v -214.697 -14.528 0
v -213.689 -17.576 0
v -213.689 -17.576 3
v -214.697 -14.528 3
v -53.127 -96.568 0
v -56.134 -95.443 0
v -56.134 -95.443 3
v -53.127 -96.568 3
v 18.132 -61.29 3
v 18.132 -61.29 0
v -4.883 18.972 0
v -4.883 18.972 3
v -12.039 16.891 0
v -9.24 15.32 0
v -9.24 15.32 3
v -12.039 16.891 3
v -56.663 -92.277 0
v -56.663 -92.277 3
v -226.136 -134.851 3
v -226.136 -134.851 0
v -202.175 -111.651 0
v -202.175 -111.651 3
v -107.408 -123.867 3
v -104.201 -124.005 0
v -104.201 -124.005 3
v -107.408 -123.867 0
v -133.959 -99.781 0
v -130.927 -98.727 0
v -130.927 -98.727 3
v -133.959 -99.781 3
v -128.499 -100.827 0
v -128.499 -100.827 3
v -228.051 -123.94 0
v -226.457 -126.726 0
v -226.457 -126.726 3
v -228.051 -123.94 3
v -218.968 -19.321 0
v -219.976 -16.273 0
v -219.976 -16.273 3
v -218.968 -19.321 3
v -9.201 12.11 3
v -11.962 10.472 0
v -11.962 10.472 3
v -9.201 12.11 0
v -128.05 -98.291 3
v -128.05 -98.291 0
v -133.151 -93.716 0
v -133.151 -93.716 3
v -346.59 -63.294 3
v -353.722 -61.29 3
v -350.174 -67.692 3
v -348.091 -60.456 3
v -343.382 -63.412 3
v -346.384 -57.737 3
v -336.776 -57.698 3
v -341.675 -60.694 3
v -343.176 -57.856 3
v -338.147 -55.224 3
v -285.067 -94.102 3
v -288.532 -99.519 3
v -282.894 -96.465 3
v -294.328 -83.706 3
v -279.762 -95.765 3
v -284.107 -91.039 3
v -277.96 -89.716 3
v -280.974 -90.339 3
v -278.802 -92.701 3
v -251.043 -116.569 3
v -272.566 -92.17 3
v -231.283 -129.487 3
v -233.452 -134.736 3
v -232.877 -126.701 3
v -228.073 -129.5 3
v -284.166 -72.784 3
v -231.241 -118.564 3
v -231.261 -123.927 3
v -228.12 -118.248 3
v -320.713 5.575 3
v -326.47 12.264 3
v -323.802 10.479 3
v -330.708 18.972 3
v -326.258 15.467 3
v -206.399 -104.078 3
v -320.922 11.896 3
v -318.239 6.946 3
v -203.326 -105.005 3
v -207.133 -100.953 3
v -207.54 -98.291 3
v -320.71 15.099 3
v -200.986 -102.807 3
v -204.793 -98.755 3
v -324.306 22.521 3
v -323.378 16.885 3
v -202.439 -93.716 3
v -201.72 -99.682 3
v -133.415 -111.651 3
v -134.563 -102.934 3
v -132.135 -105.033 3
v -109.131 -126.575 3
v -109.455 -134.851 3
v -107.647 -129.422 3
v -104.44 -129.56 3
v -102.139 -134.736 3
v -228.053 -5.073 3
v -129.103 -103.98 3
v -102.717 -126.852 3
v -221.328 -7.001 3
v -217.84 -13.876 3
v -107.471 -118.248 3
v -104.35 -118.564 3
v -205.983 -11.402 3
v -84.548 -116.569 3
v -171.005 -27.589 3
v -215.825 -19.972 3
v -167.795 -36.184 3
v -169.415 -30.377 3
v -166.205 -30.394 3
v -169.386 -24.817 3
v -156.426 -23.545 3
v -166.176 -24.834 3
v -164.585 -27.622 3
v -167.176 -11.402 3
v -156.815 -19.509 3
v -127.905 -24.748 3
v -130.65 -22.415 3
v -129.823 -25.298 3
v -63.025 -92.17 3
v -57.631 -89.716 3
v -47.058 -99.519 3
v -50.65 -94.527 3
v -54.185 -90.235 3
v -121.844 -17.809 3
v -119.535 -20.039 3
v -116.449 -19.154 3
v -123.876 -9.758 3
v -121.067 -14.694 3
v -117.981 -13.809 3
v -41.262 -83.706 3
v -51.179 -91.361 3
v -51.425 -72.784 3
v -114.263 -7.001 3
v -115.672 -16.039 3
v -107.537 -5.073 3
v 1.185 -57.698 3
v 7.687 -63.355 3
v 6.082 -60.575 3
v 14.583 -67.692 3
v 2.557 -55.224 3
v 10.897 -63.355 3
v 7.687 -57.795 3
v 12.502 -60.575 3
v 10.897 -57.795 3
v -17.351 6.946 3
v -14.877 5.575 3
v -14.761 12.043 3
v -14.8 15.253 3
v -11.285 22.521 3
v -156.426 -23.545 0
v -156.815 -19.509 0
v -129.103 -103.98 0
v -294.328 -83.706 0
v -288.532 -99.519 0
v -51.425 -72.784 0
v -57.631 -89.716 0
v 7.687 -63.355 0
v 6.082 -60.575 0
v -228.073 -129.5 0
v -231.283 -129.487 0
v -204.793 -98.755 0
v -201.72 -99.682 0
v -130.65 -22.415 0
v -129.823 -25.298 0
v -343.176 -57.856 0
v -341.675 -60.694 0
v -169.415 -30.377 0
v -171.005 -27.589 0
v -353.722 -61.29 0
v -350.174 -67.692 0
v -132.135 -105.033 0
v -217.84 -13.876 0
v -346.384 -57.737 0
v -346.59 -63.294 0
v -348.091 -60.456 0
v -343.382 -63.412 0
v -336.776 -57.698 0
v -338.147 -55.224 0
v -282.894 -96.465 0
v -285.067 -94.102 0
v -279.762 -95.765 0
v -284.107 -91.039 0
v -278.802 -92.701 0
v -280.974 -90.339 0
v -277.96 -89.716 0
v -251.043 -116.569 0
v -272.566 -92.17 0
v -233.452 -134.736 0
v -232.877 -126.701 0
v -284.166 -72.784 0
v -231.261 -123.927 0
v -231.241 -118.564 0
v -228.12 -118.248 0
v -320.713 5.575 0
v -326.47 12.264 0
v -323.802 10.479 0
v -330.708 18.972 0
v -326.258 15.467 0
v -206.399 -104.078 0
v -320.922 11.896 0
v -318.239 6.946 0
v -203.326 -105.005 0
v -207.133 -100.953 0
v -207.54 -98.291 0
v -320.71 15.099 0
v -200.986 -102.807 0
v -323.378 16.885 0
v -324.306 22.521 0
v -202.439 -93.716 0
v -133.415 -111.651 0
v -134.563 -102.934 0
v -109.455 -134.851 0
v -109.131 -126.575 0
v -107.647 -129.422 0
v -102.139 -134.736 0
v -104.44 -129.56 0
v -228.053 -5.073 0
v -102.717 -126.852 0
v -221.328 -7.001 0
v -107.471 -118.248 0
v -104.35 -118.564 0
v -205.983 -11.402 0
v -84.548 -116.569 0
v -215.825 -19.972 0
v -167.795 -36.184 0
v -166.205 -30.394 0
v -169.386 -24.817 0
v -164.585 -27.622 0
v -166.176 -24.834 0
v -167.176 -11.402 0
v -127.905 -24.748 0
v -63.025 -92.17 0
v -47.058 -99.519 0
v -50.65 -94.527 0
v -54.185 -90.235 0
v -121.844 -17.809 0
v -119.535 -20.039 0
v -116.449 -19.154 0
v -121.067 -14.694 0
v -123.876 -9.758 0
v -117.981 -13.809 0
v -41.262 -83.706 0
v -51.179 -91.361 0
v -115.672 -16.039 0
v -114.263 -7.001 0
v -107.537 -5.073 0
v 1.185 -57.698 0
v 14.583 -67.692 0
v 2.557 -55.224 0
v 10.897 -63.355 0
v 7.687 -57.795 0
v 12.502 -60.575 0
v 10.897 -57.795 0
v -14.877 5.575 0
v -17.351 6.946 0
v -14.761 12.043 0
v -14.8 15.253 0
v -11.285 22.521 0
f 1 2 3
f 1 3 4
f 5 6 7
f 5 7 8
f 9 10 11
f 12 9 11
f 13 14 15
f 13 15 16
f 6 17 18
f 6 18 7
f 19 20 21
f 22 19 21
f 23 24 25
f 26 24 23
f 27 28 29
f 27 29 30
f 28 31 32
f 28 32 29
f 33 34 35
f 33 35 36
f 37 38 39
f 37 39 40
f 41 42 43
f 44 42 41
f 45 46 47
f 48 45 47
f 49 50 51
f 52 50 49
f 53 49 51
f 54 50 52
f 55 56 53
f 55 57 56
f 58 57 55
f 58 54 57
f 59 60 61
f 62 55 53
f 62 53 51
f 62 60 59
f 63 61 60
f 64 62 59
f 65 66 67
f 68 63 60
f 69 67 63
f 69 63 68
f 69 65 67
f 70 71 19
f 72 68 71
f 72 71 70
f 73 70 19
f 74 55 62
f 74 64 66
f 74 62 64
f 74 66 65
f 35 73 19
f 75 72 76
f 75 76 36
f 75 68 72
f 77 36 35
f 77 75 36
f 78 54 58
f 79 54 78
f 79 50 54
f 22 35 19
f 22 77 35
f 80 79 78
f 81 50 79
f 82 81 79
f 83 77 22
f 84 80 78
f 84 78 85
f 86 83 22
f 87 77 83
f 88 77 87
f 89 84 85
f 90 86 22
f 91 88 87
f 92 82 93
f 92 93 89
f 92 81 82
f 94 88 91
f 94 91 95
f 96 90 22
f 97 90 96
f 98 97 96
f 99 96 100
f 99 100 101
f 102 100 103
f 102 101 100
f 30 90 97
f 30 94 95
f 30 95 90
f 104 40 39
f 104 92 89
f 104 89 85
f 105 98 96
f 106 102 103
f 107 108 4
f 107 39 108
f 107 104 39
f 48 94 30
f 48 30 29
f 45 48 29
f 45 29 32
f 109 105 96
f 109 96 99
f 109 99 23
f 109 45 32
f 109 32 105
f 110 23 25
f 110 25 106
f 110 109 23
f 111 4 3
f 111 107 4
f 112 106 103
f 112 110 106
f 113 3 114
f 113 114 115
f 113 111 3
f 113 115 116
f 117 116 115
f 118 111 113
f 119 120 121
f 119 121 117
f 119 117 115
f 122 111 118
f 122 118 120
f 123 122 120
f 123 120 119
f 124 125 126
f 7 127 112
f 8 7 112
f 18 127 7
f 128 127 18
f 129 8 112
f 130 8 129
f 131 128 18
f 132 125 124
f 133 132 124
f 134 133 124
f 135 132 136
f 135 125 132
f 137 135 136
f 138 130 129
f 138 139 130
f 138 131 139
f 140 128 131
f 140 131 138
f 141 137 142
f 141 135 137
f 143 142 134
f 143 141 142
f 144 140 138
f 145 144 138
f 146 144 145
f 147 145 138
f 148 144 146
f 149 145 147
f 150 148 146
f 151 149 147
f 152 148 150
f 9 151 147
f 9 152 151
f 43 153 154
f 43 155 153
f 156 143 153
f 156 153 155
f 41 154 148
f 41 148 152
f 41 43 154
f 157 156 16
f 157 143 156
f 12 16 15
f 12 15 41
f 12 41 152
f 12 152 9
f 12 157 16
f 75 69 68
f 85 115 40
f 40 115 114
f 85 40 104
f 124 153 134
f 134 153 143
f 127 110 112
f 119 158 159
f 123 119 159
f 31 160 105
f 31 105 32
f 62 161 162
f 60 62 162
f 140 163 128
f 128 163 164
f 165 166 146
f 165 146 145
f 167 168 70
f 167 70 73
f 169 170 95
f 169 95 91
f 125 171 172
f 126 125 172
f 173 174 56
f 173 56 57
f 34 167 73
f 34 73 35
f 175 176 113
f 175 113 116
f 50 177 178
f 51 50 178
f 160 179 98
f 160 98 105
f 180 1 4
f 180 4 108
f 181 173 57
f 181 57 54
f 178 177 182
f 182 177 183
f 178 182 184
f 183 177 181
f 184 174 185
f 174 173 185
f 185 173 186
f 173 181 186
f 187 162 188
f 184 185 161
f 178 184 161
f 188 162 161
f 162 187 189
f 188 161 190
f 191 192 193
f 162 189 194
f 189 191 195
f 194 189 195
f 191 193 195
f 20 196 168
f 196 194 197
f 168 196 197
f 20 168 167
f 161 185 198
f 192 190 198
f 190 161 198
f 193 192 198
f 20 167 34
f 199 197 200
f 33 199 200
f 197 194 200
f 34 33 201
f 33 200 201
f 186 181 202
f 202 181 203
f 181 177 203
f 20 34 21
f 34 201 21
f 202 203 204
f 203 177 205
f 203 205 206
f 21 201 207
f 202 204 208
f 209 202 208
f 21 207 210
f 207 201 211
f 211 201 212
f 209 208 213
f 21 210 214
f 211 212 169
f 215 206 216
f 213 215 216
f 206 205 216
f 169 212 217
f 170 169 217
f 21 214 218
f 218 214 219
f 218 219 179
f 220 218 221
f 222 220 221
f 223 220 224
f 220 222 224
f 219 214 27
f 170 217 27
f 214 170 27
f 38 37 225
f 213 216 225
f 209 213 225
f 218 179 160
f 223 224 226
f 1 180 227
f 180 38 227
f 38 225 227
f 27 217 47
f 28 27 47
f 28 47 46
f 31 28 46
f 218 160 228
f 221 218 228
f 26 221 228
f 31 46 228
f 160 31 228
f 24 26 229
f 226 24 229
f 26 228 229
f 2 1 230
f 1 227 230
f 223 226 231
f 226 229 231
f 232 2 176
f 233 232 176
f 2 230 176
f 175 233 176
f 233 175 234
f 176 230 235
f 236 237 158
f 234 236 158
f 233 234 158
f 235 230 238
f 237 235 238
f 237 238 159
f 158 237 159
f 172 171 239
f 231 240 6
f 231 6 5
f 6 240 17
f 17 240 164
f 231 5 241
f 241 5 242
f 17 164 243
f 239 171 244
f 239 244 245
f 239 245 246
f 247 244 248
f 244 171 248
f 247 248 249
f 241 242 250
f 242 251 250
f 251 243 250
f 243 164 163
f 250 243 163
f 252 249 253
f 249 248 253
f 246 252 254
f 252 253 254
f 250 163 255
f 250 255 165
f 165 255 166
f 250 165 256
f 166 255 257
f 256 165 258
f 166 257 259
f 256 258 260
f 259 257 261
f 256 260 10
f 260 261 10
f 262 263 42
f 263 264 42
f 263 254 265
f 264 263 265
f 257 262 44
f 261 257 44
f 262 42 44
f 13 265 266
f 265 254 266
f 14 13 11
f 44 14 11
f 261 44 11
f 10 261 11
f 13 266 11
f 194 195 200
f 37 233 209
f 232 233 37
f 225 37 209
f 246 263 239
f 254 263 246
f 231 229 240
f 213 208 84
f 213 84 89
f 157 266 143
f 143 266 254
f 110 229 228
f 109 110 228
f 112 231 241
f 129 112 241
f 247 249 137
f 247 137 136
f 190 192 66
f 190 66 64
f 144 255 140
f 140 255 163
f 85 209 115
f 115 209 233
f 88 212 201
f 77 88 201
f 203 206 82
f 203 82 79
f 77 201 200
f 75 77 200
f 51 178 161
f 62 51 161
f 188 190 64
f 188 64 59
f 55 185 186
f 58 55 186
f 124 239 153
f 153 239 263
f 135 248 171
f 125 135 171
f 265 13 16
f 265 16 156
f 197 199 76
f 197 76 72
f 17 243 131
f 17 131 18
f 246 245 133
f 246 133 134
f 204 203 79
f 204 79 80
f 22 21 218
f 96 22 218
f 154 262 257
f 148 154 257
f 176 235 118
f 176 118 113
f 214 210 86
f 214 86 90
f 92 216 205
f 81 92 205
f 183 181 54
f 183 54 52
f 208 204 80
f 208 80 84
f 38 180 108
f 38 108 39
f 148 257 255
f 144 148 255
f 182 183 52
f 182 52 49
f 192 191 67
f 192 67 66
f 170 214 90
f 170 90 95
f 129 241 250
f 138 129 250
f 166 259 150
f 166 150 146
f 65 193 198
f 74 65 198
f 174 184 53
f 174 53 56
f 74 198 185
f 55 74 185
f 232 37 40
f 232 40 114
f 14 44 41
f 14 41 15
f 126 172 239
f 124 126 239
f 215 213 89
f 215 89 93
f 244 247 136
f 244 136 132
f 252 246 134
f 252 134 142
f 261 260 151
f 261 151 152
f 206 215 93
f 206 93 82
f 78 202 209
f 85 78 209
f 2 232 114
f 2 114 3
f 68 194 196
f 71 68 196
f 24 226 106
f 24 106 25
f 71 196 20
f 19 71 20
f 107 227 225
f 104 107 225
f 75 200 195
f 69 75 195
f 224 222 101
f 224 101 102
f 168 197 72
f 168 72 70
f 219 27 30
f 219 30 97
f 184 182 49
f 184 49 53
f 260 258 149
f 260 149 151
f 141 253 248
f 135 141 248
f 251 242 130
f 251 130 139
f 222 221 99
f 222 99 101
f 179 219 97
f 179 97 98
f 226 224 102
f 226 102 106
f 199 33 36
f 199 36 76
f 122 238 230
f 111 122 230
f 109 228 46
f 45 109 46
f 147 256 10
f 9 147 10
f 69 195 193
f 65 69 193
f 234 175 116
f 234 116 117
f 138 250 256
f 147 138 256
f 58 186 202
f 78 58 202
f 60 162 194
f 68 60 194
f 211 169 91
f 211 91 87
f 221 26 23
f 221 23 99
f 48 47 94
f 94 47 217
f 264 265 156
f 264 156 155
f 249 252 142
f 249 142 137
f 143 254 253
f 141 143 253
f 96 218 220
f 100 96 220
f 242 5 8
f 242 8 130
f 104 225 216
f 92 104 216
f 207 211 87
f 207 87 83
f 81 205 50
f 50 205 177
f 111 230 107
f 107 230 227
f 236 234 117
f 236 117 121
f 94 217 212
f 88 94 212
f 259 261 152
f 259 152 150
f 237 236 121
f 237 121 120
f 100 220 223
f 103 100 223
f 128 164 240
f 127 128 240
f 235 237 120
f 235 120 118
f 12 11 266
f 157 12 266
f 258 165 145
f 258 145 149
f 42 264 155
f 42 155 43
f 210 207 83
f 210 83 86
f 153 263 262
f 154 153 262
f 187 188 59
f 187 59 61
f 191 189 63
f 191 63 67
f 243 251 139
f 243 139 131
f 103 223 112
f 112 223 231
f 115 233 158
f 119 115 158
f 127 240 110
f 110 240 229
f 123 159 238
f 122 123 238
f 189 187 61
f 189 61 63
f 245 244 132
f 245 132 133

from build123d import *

# Parameters (mm, degrees)
BOSS_EXTRU_1_DEPTH = 3


with BuildPart() as part:
    # Esquisse1 → Boss.-Extru.1 (new body)
    with BuildSketch(Plane.XY):
        Polygon((-207.540430482, -98.290842938), (-228.119574859, -118.248029963), (-231.240854108, -118.563827288), (-272.565847516, -92.169507978), (-277.959789872, -89.716454796), (-284.165989399, -72.783703169), (-336.775785376, -57.698086926), (-338.147034057, -55.224288823), (-320.713145188, 5.574907028), (-318.239316427, 6.946262636), (-167.795259872, -36.183821192), (-156.425730461, -23.544541546), (-156.815310501, -19.508703235), (-167.175777529, -11.401531345), (-205.982988252, -11.401531345), (-221.327812729, -7.001473731), (-228.053301524, -5.072970852), (-324.305573392, 22.521130566), (-330.707501003, 18.97225141), (-353.72243999, -61.290379239), (-350.173829458, -67.692242105), (-294.328030452, -83.705767284), (-288.532091821, -99.519179156), (-251.042661762, -116.568594893), (-233.45174982, -134.735979634), (-226.135810249, -134.851076098), (-202.175390102, -111.650948678), (-133.415129641, -111.650948678), (-109.454709494, -134.851076098), (-102.138769923, -134.735979634), (-84.547857981, -116.568594893), (-47.058427922, -99.519179156), (-41.262489291, -83.705767284), (14.583309715, -67.692242105), (18.131920247, -61.290379239), (-4.88301874, 18.97225141), (-11.284946351, 22.521130566), (-107.537218219, -5.072970852), (-114.262707014, -7.001473731), (-123.876268292, -9.758118068), (-130.649820486, -22.415487094), (-129.8232917, -25.297935522), (-127.904950096, -24.747859919), (-17.351203316, 6.946262636), (-14.877374555, 5.574907028), (2.556514314, -55.224288823), (1.185265633, -57.698086926), (-51.424530344, -72.783703169), (-57.630729871, -89.716454796), (-63.024672228, -92.169507978), (-104.349665635, -118.563827288), (-107.470944884, -118.248029963), (-128.050089261, -98.290842938), (-133.151477342, -93.715936913), (-202.439042401, -93.715936913), align=None)
        Polygon((-214.696831686, -14.527657653), (-217.840116073, -13.876277124), (-219.975870353, -16.272750989), (-218.968340246, -19.320605385), (-215.825055858, -19.971985915), (-213.689301579, -17.575512049), align=None, mode=Mode.SUBTRACT)
        Polygon((-166.175746894, -24.833958909), (-169.385770719, -24.817214521), (-171.005283697, -27.588804506), (-169.414772849, -30.37713888), (-166.204749024, -30.393883267), (-164.585236046, -27.622293282), align=None, mode=Mode.SUBTRACT)
        Polygon((-115.672169645, -16.039488624), (-117.981174931, -13.809459943), (-121.066939064, -14.694102838), (-121.84369791, -17.808774414), (-119.534692623, -20.038803095), (-116.448928491, -19.154160201), align=None, mode=Mode.SUBTRACT)
        Polygon((-9.240055353, 15.320178943), (-12.039253575, 16.891491339), (-14.799649138, 15.252970767), (-14.76084648, 12.043137798), (-11.961648258, 10.471825402), (-9.201252694, 12.110345974), align=None, mode=Mode.SUBTRACT)
        Polygon((12.502351781, -60.574933915), (10.897318032, -57.794933915), (7.687250536, -57.794933915), (6.082216787, -60.574933915), (7.687250536, -63.354933915), (10.897318032, -63.354933915), align=None, mode=Mode.SUBTRACT)
        Polygon((-50.649763202, -94.526851626), (-51.178552765, -91.36063702), (-54.18496983, -90.235474912), (-56.662597331, -92.27652741), (-56.133807767, -95.442742016), (-53.127390703, -96.567904124), align=None, mode=Mode.SUBTRACT)
        Polygon((-104.440215275, -129.559925429), (-102.716844109, -126.851692582), (-104.200556971, -124.005092948), (-107.407640999, -123.866726161), (-109.131012166, -126.574959009), (-107.647299303, -129.421558643), align=None, mode=Mode.SUBTRACT)
        Polygon((-132.134816884, -105.032961295), (-129.102521286, -103.979530359), (-128.498671438, -100.826769871), (-130.927117189, -98.727440319), (-133.959412787, -99.780871255), (-134.563262635, -102.933631743), align=None, mode=Mode.SUBTRACT)
        Polygon((-200.986265397, -102.807259839), (-201.720052379, -99.68218544), (-204.793339689, -98.755126408), (-207.132840016, -100.953141775), (-206.399053033, -104.078216174), (-203.325765724, -105.005275206), align=None, mode=Mode.SUBTRACT)
        Polygon((-228.072581173, -129.499661036), (-226.456549288, -126.726039887), (-228.050559721, -123.939704646), (-231.260602039, -123.926990555), (-232.876633924, -126.700611704), (-231.282623491, -129.486946945), align=None, mode=Mode.SUBTRACT)
        Polygon((-279.761510176, -95.764600045), (-278.801584282, -92.701419409), (-280.974413583, -90.338508881), (-284.107168778, -91.03877899), (-285.067094671, -94.101959627), (-282.89426537, -96.464870154), align=None, mode=Mode.SUBTRACT)
        Polygon((-343.381773974, -63.412440235), (-341.674936445, -60.693756917), (-343.175966498, -57.856250598), (-346.38383408, -57.737427596), (-348.09067161, -60.456110913), (-346.589641557, -63.293617233), align=None, mode=Mode.SUBTRACT)
        Polygon((-323.377643582, 16.884689567), (-326.25776259, 15.467139628), (-326.470187835, 12.264108431), (-323.802494072, 10.478627174), (-320.922375064, 11.896177113), (-320.709949819, 15.09920831), align=None, mode=Mode.SUBTRACT)
    extrude(amount=BOSS_EXTRU_1_DEPTH)


solid = part.part
